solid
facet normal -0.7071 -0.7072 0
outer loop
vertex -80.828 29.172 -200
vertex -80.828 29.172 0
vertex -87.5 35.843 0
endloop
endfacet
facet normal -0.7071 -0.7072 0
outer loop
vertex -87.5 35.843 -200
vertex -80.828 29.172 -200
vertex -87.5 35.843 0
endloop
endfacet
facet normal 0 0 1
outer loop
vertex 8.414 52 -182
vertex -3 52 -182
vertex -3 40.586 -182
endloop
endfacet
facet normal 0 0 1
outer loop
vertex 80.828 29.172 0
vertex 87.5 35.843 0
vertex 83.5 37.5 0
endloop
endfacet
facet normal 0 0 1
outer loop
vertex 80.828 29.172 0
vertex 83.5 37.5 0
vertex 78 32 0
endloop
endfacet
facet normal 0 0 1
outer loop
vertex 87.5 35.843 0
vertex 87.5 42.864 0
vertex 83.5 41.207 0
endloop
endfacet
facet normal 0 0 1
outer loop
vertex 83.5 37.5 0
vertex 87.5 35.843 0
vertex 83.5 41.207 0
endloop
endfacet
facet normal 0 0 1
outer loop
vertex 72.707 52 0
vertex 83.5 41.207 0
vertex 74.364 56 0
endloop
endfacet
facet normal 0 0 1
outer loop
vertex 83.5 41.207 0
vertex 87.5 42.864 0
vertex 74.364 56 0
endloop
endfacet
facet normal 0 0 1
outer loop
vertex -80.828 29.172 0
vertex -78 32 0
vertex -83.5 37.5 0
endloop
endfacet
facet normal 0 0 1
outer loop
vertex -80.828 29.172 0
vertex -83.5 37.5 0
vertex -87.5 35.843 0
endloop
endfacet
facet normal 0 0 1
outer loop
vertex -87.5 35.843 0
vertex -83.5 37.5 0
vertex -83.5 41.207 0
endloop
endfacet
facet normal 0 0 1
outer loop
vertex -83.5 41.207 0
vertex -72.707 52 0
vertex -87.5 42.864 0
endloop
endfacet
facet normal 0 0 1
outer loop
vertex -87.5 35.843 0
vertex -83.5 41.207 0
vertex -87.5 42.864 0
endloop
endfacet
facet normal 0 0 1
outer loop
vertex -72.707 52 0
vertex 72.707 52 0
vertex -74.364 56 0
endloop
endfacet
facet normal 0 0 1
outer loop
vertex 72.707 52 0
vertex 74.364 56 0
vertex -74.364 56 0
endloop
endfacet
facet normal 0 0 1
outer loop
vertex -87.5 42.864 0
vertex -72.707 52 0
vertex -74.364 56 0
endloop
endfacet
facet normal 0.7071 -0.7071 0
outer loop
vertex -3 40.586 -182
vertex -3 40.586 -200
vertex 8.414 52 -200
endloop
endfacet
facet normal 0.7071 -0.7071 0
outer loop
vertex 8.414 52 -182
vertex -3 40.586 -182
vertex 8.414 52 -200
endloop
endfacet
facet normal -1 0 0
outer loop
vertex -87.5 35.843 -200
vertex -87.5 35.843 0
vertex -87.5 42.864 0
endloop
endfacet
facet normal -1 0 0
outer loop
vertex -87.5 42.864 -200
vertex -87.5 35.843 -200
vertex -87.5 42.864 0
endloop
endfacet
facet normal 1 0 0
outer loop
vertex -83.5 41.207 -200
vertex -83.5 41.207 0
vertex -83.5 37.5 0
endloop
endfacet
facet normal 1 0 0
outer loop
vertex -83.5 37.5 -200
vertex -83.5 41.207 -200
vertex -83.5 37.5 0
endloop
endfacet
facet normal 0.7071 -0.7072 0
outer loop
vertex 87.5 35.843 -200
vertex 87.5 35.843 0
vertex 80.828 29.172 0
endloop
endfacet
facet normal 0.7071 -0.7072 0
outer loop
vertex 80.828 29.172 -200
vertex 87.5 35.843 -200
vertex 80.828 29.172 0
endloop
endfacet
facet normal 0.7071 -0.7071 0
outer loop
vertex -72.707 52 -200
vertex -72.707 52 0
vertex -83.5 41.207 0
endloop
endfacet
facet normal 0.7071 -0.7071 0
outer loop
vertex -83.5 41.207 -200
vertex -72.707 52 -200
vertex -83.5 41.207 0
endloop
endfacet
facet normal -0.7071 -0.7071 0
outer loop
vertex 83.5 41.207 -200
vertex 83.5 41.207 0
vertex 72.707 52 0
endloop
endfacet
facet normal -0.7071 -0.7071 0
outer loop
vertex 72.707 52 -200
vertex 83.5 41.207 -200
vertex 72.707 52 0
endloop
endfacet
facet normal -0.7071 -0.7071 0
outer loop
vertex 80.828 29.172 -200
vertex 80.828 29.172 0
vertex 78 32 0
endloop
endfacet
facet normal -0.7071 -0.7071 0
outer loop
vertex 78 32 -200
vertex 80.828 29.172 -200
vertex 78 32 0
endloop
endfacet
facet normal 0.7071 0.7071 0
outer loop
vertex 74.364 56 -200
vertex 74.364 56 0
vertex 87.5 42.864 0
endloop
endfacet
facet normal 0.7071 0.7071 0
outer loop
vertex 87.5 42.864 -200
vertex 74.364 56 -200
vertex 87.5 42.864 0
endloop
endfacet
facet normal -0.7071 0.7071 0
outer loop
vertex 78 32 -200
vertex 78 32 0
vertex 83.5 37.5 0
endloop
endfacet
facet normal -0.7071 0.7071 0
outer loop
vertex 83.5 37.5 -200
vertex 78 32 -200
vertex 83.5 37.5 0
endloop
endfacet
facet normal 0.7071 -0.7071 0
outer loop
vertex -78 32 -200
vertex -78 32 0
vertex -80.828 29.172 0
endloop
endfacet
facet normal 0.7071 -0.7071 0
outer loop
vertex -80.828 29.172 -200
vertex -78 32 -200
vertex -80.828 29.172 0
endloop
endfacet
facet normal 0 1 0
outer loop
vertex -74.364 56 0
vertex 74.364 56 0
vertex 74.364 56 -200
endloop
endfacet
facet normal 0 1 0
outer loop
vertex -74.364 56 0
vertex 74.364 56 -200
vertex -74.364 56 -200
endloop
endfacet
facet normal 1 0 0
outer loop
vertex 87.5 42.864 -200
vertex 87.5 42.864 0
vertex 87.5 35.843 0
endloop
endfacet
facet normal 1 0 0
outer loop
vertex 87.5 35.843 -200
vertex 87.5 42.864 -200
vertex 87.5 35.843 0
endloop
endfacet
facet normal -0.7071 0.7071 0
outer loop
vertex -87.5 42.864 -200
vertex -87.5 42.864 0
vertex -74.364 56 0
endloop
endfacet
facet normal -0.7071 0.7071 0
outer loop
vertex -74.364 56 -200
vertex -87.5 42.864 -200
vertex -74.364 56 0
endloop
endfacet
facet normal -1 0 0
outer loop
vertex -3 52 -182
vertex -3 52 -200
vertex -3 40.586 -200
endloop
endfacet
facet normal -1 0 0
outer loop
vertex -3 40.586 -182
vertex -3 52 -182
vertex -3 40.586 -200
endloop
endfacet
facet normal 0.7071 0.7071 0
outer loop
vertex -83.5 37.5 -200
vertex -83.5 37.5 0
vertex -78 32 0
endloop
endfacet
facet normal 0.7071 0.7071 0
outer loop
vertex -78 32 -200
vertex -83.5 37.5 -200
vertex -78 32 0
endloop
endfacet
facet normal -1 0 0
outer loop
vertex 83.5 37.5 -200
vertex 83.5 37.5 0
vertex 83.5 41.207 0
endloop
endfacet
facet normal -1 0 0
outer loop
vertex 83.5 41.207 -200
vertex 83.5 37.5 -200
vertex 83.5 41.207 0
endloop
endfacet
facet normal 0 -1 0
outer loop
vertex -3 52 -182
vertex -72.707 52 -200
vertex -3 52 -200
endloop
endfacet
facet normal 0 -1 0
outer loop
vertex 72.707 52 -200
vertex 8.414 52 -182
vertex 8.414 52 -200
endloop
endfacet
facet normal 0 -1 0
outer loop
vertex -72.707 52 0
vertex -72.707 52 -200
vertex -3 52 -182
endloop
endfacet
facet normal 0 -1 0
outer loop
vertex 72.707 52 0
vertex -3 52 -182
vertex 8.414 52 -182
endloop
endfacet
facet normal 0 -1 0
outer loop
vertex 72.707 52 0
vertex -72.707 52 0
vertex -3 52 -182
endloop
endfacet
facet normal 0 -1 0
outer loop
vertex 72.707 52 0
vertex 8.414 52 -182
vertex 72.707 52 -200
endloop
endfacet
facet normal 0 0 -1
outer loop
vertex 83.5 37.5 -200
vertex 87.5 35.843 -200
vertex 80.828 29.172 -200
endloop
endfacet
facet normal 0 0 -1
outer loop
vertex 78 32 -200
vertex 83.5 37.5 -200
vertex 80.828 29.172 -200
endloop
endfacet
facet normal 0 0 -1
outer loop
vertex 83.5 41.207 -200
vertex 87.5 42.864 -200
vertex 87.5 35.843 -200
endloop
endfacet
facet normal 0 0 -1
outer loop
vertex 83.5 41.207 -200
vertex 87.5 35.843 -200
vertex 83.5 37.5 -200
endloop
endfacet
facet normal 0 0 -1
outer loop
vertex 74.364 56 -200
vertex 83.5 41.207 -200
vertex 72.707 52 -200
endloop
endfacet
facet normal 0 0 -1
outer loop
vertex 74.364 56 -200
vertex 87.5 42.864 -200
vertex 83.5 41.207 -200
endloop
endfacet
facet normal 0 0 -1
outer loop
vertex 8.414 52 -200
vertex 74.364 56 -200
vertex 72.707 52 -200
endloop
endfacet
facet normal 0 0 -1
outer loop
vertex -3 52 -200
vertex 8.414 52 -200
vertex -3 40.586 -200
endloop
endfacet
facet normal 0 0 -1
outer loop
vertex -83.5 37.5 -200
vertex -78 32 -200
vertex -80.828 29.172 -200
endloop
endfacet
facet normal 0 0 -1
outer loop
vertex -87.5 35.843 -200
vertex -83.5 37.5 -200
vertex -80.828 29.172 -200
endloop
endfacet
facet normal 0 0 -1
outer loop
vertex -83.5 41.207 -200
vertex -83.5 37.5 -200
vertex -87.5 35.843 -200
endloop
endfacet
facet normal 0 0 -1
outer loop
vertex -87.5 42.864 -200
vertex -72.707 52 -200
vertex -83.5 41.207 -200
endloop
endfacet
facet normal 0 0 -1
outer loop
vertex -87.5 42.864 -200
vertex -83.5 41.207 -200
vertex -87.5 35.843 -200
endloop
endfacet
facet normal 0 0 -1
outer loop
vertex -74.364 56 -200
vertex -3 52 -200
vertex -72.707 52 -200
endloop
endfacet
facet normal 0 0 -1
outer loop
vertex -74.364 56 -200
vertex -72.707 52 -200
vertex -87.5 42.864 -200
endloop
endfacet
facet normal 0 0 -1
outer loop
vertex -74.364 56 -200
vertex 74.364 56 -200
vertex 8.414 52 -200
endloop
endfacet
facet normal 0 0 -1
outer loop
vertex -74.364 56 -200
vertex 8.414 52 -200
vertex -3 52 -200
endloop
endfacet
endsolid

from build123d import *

# Parameters (mm, degrees)
EXTRUDE_1_DEPTH   = 200
EXTRUDE_1_2_DEPTH = 18


with BuildPart() as part:
    # 草图1 → Extrude 1 (new body)
    with BuildSketch(Plane.XY):
        Polygon((78, 32), (83.5, 37.5), (83.5, 41.207106781), (72.707106781, 52), (0, 52), (-72.707106781, 52), (-83.5, 41.207106781), (-83.5, 37.5), (-78, 32), (-80.828427125, 29.171572875), (-87.5, 35.843145751), (-87.5, 42.863961031), (-74.363961031, 56), (0, 56), (74.363961031, 56), (87.5, 42.863961031), (87.5, 35.843145751), (80.828427125, 29.171572875), align=None)
    extrude(amount=-EXTRUDE_1_DEPTH)

    # 草图2 → Extrude 1 2 (add)
    with BuildSketch(Plane(origin=(0, 0, -200), x_dir=(-1, 0, 0), z_dir=(0, 0, -1))):
        Polygon((-8.414213562, 52), (3, 52), (3, 40.585786438), align=None)
    extrude(amount=-EXTRUDE_1_2_DEPTH)


solid = part.part
